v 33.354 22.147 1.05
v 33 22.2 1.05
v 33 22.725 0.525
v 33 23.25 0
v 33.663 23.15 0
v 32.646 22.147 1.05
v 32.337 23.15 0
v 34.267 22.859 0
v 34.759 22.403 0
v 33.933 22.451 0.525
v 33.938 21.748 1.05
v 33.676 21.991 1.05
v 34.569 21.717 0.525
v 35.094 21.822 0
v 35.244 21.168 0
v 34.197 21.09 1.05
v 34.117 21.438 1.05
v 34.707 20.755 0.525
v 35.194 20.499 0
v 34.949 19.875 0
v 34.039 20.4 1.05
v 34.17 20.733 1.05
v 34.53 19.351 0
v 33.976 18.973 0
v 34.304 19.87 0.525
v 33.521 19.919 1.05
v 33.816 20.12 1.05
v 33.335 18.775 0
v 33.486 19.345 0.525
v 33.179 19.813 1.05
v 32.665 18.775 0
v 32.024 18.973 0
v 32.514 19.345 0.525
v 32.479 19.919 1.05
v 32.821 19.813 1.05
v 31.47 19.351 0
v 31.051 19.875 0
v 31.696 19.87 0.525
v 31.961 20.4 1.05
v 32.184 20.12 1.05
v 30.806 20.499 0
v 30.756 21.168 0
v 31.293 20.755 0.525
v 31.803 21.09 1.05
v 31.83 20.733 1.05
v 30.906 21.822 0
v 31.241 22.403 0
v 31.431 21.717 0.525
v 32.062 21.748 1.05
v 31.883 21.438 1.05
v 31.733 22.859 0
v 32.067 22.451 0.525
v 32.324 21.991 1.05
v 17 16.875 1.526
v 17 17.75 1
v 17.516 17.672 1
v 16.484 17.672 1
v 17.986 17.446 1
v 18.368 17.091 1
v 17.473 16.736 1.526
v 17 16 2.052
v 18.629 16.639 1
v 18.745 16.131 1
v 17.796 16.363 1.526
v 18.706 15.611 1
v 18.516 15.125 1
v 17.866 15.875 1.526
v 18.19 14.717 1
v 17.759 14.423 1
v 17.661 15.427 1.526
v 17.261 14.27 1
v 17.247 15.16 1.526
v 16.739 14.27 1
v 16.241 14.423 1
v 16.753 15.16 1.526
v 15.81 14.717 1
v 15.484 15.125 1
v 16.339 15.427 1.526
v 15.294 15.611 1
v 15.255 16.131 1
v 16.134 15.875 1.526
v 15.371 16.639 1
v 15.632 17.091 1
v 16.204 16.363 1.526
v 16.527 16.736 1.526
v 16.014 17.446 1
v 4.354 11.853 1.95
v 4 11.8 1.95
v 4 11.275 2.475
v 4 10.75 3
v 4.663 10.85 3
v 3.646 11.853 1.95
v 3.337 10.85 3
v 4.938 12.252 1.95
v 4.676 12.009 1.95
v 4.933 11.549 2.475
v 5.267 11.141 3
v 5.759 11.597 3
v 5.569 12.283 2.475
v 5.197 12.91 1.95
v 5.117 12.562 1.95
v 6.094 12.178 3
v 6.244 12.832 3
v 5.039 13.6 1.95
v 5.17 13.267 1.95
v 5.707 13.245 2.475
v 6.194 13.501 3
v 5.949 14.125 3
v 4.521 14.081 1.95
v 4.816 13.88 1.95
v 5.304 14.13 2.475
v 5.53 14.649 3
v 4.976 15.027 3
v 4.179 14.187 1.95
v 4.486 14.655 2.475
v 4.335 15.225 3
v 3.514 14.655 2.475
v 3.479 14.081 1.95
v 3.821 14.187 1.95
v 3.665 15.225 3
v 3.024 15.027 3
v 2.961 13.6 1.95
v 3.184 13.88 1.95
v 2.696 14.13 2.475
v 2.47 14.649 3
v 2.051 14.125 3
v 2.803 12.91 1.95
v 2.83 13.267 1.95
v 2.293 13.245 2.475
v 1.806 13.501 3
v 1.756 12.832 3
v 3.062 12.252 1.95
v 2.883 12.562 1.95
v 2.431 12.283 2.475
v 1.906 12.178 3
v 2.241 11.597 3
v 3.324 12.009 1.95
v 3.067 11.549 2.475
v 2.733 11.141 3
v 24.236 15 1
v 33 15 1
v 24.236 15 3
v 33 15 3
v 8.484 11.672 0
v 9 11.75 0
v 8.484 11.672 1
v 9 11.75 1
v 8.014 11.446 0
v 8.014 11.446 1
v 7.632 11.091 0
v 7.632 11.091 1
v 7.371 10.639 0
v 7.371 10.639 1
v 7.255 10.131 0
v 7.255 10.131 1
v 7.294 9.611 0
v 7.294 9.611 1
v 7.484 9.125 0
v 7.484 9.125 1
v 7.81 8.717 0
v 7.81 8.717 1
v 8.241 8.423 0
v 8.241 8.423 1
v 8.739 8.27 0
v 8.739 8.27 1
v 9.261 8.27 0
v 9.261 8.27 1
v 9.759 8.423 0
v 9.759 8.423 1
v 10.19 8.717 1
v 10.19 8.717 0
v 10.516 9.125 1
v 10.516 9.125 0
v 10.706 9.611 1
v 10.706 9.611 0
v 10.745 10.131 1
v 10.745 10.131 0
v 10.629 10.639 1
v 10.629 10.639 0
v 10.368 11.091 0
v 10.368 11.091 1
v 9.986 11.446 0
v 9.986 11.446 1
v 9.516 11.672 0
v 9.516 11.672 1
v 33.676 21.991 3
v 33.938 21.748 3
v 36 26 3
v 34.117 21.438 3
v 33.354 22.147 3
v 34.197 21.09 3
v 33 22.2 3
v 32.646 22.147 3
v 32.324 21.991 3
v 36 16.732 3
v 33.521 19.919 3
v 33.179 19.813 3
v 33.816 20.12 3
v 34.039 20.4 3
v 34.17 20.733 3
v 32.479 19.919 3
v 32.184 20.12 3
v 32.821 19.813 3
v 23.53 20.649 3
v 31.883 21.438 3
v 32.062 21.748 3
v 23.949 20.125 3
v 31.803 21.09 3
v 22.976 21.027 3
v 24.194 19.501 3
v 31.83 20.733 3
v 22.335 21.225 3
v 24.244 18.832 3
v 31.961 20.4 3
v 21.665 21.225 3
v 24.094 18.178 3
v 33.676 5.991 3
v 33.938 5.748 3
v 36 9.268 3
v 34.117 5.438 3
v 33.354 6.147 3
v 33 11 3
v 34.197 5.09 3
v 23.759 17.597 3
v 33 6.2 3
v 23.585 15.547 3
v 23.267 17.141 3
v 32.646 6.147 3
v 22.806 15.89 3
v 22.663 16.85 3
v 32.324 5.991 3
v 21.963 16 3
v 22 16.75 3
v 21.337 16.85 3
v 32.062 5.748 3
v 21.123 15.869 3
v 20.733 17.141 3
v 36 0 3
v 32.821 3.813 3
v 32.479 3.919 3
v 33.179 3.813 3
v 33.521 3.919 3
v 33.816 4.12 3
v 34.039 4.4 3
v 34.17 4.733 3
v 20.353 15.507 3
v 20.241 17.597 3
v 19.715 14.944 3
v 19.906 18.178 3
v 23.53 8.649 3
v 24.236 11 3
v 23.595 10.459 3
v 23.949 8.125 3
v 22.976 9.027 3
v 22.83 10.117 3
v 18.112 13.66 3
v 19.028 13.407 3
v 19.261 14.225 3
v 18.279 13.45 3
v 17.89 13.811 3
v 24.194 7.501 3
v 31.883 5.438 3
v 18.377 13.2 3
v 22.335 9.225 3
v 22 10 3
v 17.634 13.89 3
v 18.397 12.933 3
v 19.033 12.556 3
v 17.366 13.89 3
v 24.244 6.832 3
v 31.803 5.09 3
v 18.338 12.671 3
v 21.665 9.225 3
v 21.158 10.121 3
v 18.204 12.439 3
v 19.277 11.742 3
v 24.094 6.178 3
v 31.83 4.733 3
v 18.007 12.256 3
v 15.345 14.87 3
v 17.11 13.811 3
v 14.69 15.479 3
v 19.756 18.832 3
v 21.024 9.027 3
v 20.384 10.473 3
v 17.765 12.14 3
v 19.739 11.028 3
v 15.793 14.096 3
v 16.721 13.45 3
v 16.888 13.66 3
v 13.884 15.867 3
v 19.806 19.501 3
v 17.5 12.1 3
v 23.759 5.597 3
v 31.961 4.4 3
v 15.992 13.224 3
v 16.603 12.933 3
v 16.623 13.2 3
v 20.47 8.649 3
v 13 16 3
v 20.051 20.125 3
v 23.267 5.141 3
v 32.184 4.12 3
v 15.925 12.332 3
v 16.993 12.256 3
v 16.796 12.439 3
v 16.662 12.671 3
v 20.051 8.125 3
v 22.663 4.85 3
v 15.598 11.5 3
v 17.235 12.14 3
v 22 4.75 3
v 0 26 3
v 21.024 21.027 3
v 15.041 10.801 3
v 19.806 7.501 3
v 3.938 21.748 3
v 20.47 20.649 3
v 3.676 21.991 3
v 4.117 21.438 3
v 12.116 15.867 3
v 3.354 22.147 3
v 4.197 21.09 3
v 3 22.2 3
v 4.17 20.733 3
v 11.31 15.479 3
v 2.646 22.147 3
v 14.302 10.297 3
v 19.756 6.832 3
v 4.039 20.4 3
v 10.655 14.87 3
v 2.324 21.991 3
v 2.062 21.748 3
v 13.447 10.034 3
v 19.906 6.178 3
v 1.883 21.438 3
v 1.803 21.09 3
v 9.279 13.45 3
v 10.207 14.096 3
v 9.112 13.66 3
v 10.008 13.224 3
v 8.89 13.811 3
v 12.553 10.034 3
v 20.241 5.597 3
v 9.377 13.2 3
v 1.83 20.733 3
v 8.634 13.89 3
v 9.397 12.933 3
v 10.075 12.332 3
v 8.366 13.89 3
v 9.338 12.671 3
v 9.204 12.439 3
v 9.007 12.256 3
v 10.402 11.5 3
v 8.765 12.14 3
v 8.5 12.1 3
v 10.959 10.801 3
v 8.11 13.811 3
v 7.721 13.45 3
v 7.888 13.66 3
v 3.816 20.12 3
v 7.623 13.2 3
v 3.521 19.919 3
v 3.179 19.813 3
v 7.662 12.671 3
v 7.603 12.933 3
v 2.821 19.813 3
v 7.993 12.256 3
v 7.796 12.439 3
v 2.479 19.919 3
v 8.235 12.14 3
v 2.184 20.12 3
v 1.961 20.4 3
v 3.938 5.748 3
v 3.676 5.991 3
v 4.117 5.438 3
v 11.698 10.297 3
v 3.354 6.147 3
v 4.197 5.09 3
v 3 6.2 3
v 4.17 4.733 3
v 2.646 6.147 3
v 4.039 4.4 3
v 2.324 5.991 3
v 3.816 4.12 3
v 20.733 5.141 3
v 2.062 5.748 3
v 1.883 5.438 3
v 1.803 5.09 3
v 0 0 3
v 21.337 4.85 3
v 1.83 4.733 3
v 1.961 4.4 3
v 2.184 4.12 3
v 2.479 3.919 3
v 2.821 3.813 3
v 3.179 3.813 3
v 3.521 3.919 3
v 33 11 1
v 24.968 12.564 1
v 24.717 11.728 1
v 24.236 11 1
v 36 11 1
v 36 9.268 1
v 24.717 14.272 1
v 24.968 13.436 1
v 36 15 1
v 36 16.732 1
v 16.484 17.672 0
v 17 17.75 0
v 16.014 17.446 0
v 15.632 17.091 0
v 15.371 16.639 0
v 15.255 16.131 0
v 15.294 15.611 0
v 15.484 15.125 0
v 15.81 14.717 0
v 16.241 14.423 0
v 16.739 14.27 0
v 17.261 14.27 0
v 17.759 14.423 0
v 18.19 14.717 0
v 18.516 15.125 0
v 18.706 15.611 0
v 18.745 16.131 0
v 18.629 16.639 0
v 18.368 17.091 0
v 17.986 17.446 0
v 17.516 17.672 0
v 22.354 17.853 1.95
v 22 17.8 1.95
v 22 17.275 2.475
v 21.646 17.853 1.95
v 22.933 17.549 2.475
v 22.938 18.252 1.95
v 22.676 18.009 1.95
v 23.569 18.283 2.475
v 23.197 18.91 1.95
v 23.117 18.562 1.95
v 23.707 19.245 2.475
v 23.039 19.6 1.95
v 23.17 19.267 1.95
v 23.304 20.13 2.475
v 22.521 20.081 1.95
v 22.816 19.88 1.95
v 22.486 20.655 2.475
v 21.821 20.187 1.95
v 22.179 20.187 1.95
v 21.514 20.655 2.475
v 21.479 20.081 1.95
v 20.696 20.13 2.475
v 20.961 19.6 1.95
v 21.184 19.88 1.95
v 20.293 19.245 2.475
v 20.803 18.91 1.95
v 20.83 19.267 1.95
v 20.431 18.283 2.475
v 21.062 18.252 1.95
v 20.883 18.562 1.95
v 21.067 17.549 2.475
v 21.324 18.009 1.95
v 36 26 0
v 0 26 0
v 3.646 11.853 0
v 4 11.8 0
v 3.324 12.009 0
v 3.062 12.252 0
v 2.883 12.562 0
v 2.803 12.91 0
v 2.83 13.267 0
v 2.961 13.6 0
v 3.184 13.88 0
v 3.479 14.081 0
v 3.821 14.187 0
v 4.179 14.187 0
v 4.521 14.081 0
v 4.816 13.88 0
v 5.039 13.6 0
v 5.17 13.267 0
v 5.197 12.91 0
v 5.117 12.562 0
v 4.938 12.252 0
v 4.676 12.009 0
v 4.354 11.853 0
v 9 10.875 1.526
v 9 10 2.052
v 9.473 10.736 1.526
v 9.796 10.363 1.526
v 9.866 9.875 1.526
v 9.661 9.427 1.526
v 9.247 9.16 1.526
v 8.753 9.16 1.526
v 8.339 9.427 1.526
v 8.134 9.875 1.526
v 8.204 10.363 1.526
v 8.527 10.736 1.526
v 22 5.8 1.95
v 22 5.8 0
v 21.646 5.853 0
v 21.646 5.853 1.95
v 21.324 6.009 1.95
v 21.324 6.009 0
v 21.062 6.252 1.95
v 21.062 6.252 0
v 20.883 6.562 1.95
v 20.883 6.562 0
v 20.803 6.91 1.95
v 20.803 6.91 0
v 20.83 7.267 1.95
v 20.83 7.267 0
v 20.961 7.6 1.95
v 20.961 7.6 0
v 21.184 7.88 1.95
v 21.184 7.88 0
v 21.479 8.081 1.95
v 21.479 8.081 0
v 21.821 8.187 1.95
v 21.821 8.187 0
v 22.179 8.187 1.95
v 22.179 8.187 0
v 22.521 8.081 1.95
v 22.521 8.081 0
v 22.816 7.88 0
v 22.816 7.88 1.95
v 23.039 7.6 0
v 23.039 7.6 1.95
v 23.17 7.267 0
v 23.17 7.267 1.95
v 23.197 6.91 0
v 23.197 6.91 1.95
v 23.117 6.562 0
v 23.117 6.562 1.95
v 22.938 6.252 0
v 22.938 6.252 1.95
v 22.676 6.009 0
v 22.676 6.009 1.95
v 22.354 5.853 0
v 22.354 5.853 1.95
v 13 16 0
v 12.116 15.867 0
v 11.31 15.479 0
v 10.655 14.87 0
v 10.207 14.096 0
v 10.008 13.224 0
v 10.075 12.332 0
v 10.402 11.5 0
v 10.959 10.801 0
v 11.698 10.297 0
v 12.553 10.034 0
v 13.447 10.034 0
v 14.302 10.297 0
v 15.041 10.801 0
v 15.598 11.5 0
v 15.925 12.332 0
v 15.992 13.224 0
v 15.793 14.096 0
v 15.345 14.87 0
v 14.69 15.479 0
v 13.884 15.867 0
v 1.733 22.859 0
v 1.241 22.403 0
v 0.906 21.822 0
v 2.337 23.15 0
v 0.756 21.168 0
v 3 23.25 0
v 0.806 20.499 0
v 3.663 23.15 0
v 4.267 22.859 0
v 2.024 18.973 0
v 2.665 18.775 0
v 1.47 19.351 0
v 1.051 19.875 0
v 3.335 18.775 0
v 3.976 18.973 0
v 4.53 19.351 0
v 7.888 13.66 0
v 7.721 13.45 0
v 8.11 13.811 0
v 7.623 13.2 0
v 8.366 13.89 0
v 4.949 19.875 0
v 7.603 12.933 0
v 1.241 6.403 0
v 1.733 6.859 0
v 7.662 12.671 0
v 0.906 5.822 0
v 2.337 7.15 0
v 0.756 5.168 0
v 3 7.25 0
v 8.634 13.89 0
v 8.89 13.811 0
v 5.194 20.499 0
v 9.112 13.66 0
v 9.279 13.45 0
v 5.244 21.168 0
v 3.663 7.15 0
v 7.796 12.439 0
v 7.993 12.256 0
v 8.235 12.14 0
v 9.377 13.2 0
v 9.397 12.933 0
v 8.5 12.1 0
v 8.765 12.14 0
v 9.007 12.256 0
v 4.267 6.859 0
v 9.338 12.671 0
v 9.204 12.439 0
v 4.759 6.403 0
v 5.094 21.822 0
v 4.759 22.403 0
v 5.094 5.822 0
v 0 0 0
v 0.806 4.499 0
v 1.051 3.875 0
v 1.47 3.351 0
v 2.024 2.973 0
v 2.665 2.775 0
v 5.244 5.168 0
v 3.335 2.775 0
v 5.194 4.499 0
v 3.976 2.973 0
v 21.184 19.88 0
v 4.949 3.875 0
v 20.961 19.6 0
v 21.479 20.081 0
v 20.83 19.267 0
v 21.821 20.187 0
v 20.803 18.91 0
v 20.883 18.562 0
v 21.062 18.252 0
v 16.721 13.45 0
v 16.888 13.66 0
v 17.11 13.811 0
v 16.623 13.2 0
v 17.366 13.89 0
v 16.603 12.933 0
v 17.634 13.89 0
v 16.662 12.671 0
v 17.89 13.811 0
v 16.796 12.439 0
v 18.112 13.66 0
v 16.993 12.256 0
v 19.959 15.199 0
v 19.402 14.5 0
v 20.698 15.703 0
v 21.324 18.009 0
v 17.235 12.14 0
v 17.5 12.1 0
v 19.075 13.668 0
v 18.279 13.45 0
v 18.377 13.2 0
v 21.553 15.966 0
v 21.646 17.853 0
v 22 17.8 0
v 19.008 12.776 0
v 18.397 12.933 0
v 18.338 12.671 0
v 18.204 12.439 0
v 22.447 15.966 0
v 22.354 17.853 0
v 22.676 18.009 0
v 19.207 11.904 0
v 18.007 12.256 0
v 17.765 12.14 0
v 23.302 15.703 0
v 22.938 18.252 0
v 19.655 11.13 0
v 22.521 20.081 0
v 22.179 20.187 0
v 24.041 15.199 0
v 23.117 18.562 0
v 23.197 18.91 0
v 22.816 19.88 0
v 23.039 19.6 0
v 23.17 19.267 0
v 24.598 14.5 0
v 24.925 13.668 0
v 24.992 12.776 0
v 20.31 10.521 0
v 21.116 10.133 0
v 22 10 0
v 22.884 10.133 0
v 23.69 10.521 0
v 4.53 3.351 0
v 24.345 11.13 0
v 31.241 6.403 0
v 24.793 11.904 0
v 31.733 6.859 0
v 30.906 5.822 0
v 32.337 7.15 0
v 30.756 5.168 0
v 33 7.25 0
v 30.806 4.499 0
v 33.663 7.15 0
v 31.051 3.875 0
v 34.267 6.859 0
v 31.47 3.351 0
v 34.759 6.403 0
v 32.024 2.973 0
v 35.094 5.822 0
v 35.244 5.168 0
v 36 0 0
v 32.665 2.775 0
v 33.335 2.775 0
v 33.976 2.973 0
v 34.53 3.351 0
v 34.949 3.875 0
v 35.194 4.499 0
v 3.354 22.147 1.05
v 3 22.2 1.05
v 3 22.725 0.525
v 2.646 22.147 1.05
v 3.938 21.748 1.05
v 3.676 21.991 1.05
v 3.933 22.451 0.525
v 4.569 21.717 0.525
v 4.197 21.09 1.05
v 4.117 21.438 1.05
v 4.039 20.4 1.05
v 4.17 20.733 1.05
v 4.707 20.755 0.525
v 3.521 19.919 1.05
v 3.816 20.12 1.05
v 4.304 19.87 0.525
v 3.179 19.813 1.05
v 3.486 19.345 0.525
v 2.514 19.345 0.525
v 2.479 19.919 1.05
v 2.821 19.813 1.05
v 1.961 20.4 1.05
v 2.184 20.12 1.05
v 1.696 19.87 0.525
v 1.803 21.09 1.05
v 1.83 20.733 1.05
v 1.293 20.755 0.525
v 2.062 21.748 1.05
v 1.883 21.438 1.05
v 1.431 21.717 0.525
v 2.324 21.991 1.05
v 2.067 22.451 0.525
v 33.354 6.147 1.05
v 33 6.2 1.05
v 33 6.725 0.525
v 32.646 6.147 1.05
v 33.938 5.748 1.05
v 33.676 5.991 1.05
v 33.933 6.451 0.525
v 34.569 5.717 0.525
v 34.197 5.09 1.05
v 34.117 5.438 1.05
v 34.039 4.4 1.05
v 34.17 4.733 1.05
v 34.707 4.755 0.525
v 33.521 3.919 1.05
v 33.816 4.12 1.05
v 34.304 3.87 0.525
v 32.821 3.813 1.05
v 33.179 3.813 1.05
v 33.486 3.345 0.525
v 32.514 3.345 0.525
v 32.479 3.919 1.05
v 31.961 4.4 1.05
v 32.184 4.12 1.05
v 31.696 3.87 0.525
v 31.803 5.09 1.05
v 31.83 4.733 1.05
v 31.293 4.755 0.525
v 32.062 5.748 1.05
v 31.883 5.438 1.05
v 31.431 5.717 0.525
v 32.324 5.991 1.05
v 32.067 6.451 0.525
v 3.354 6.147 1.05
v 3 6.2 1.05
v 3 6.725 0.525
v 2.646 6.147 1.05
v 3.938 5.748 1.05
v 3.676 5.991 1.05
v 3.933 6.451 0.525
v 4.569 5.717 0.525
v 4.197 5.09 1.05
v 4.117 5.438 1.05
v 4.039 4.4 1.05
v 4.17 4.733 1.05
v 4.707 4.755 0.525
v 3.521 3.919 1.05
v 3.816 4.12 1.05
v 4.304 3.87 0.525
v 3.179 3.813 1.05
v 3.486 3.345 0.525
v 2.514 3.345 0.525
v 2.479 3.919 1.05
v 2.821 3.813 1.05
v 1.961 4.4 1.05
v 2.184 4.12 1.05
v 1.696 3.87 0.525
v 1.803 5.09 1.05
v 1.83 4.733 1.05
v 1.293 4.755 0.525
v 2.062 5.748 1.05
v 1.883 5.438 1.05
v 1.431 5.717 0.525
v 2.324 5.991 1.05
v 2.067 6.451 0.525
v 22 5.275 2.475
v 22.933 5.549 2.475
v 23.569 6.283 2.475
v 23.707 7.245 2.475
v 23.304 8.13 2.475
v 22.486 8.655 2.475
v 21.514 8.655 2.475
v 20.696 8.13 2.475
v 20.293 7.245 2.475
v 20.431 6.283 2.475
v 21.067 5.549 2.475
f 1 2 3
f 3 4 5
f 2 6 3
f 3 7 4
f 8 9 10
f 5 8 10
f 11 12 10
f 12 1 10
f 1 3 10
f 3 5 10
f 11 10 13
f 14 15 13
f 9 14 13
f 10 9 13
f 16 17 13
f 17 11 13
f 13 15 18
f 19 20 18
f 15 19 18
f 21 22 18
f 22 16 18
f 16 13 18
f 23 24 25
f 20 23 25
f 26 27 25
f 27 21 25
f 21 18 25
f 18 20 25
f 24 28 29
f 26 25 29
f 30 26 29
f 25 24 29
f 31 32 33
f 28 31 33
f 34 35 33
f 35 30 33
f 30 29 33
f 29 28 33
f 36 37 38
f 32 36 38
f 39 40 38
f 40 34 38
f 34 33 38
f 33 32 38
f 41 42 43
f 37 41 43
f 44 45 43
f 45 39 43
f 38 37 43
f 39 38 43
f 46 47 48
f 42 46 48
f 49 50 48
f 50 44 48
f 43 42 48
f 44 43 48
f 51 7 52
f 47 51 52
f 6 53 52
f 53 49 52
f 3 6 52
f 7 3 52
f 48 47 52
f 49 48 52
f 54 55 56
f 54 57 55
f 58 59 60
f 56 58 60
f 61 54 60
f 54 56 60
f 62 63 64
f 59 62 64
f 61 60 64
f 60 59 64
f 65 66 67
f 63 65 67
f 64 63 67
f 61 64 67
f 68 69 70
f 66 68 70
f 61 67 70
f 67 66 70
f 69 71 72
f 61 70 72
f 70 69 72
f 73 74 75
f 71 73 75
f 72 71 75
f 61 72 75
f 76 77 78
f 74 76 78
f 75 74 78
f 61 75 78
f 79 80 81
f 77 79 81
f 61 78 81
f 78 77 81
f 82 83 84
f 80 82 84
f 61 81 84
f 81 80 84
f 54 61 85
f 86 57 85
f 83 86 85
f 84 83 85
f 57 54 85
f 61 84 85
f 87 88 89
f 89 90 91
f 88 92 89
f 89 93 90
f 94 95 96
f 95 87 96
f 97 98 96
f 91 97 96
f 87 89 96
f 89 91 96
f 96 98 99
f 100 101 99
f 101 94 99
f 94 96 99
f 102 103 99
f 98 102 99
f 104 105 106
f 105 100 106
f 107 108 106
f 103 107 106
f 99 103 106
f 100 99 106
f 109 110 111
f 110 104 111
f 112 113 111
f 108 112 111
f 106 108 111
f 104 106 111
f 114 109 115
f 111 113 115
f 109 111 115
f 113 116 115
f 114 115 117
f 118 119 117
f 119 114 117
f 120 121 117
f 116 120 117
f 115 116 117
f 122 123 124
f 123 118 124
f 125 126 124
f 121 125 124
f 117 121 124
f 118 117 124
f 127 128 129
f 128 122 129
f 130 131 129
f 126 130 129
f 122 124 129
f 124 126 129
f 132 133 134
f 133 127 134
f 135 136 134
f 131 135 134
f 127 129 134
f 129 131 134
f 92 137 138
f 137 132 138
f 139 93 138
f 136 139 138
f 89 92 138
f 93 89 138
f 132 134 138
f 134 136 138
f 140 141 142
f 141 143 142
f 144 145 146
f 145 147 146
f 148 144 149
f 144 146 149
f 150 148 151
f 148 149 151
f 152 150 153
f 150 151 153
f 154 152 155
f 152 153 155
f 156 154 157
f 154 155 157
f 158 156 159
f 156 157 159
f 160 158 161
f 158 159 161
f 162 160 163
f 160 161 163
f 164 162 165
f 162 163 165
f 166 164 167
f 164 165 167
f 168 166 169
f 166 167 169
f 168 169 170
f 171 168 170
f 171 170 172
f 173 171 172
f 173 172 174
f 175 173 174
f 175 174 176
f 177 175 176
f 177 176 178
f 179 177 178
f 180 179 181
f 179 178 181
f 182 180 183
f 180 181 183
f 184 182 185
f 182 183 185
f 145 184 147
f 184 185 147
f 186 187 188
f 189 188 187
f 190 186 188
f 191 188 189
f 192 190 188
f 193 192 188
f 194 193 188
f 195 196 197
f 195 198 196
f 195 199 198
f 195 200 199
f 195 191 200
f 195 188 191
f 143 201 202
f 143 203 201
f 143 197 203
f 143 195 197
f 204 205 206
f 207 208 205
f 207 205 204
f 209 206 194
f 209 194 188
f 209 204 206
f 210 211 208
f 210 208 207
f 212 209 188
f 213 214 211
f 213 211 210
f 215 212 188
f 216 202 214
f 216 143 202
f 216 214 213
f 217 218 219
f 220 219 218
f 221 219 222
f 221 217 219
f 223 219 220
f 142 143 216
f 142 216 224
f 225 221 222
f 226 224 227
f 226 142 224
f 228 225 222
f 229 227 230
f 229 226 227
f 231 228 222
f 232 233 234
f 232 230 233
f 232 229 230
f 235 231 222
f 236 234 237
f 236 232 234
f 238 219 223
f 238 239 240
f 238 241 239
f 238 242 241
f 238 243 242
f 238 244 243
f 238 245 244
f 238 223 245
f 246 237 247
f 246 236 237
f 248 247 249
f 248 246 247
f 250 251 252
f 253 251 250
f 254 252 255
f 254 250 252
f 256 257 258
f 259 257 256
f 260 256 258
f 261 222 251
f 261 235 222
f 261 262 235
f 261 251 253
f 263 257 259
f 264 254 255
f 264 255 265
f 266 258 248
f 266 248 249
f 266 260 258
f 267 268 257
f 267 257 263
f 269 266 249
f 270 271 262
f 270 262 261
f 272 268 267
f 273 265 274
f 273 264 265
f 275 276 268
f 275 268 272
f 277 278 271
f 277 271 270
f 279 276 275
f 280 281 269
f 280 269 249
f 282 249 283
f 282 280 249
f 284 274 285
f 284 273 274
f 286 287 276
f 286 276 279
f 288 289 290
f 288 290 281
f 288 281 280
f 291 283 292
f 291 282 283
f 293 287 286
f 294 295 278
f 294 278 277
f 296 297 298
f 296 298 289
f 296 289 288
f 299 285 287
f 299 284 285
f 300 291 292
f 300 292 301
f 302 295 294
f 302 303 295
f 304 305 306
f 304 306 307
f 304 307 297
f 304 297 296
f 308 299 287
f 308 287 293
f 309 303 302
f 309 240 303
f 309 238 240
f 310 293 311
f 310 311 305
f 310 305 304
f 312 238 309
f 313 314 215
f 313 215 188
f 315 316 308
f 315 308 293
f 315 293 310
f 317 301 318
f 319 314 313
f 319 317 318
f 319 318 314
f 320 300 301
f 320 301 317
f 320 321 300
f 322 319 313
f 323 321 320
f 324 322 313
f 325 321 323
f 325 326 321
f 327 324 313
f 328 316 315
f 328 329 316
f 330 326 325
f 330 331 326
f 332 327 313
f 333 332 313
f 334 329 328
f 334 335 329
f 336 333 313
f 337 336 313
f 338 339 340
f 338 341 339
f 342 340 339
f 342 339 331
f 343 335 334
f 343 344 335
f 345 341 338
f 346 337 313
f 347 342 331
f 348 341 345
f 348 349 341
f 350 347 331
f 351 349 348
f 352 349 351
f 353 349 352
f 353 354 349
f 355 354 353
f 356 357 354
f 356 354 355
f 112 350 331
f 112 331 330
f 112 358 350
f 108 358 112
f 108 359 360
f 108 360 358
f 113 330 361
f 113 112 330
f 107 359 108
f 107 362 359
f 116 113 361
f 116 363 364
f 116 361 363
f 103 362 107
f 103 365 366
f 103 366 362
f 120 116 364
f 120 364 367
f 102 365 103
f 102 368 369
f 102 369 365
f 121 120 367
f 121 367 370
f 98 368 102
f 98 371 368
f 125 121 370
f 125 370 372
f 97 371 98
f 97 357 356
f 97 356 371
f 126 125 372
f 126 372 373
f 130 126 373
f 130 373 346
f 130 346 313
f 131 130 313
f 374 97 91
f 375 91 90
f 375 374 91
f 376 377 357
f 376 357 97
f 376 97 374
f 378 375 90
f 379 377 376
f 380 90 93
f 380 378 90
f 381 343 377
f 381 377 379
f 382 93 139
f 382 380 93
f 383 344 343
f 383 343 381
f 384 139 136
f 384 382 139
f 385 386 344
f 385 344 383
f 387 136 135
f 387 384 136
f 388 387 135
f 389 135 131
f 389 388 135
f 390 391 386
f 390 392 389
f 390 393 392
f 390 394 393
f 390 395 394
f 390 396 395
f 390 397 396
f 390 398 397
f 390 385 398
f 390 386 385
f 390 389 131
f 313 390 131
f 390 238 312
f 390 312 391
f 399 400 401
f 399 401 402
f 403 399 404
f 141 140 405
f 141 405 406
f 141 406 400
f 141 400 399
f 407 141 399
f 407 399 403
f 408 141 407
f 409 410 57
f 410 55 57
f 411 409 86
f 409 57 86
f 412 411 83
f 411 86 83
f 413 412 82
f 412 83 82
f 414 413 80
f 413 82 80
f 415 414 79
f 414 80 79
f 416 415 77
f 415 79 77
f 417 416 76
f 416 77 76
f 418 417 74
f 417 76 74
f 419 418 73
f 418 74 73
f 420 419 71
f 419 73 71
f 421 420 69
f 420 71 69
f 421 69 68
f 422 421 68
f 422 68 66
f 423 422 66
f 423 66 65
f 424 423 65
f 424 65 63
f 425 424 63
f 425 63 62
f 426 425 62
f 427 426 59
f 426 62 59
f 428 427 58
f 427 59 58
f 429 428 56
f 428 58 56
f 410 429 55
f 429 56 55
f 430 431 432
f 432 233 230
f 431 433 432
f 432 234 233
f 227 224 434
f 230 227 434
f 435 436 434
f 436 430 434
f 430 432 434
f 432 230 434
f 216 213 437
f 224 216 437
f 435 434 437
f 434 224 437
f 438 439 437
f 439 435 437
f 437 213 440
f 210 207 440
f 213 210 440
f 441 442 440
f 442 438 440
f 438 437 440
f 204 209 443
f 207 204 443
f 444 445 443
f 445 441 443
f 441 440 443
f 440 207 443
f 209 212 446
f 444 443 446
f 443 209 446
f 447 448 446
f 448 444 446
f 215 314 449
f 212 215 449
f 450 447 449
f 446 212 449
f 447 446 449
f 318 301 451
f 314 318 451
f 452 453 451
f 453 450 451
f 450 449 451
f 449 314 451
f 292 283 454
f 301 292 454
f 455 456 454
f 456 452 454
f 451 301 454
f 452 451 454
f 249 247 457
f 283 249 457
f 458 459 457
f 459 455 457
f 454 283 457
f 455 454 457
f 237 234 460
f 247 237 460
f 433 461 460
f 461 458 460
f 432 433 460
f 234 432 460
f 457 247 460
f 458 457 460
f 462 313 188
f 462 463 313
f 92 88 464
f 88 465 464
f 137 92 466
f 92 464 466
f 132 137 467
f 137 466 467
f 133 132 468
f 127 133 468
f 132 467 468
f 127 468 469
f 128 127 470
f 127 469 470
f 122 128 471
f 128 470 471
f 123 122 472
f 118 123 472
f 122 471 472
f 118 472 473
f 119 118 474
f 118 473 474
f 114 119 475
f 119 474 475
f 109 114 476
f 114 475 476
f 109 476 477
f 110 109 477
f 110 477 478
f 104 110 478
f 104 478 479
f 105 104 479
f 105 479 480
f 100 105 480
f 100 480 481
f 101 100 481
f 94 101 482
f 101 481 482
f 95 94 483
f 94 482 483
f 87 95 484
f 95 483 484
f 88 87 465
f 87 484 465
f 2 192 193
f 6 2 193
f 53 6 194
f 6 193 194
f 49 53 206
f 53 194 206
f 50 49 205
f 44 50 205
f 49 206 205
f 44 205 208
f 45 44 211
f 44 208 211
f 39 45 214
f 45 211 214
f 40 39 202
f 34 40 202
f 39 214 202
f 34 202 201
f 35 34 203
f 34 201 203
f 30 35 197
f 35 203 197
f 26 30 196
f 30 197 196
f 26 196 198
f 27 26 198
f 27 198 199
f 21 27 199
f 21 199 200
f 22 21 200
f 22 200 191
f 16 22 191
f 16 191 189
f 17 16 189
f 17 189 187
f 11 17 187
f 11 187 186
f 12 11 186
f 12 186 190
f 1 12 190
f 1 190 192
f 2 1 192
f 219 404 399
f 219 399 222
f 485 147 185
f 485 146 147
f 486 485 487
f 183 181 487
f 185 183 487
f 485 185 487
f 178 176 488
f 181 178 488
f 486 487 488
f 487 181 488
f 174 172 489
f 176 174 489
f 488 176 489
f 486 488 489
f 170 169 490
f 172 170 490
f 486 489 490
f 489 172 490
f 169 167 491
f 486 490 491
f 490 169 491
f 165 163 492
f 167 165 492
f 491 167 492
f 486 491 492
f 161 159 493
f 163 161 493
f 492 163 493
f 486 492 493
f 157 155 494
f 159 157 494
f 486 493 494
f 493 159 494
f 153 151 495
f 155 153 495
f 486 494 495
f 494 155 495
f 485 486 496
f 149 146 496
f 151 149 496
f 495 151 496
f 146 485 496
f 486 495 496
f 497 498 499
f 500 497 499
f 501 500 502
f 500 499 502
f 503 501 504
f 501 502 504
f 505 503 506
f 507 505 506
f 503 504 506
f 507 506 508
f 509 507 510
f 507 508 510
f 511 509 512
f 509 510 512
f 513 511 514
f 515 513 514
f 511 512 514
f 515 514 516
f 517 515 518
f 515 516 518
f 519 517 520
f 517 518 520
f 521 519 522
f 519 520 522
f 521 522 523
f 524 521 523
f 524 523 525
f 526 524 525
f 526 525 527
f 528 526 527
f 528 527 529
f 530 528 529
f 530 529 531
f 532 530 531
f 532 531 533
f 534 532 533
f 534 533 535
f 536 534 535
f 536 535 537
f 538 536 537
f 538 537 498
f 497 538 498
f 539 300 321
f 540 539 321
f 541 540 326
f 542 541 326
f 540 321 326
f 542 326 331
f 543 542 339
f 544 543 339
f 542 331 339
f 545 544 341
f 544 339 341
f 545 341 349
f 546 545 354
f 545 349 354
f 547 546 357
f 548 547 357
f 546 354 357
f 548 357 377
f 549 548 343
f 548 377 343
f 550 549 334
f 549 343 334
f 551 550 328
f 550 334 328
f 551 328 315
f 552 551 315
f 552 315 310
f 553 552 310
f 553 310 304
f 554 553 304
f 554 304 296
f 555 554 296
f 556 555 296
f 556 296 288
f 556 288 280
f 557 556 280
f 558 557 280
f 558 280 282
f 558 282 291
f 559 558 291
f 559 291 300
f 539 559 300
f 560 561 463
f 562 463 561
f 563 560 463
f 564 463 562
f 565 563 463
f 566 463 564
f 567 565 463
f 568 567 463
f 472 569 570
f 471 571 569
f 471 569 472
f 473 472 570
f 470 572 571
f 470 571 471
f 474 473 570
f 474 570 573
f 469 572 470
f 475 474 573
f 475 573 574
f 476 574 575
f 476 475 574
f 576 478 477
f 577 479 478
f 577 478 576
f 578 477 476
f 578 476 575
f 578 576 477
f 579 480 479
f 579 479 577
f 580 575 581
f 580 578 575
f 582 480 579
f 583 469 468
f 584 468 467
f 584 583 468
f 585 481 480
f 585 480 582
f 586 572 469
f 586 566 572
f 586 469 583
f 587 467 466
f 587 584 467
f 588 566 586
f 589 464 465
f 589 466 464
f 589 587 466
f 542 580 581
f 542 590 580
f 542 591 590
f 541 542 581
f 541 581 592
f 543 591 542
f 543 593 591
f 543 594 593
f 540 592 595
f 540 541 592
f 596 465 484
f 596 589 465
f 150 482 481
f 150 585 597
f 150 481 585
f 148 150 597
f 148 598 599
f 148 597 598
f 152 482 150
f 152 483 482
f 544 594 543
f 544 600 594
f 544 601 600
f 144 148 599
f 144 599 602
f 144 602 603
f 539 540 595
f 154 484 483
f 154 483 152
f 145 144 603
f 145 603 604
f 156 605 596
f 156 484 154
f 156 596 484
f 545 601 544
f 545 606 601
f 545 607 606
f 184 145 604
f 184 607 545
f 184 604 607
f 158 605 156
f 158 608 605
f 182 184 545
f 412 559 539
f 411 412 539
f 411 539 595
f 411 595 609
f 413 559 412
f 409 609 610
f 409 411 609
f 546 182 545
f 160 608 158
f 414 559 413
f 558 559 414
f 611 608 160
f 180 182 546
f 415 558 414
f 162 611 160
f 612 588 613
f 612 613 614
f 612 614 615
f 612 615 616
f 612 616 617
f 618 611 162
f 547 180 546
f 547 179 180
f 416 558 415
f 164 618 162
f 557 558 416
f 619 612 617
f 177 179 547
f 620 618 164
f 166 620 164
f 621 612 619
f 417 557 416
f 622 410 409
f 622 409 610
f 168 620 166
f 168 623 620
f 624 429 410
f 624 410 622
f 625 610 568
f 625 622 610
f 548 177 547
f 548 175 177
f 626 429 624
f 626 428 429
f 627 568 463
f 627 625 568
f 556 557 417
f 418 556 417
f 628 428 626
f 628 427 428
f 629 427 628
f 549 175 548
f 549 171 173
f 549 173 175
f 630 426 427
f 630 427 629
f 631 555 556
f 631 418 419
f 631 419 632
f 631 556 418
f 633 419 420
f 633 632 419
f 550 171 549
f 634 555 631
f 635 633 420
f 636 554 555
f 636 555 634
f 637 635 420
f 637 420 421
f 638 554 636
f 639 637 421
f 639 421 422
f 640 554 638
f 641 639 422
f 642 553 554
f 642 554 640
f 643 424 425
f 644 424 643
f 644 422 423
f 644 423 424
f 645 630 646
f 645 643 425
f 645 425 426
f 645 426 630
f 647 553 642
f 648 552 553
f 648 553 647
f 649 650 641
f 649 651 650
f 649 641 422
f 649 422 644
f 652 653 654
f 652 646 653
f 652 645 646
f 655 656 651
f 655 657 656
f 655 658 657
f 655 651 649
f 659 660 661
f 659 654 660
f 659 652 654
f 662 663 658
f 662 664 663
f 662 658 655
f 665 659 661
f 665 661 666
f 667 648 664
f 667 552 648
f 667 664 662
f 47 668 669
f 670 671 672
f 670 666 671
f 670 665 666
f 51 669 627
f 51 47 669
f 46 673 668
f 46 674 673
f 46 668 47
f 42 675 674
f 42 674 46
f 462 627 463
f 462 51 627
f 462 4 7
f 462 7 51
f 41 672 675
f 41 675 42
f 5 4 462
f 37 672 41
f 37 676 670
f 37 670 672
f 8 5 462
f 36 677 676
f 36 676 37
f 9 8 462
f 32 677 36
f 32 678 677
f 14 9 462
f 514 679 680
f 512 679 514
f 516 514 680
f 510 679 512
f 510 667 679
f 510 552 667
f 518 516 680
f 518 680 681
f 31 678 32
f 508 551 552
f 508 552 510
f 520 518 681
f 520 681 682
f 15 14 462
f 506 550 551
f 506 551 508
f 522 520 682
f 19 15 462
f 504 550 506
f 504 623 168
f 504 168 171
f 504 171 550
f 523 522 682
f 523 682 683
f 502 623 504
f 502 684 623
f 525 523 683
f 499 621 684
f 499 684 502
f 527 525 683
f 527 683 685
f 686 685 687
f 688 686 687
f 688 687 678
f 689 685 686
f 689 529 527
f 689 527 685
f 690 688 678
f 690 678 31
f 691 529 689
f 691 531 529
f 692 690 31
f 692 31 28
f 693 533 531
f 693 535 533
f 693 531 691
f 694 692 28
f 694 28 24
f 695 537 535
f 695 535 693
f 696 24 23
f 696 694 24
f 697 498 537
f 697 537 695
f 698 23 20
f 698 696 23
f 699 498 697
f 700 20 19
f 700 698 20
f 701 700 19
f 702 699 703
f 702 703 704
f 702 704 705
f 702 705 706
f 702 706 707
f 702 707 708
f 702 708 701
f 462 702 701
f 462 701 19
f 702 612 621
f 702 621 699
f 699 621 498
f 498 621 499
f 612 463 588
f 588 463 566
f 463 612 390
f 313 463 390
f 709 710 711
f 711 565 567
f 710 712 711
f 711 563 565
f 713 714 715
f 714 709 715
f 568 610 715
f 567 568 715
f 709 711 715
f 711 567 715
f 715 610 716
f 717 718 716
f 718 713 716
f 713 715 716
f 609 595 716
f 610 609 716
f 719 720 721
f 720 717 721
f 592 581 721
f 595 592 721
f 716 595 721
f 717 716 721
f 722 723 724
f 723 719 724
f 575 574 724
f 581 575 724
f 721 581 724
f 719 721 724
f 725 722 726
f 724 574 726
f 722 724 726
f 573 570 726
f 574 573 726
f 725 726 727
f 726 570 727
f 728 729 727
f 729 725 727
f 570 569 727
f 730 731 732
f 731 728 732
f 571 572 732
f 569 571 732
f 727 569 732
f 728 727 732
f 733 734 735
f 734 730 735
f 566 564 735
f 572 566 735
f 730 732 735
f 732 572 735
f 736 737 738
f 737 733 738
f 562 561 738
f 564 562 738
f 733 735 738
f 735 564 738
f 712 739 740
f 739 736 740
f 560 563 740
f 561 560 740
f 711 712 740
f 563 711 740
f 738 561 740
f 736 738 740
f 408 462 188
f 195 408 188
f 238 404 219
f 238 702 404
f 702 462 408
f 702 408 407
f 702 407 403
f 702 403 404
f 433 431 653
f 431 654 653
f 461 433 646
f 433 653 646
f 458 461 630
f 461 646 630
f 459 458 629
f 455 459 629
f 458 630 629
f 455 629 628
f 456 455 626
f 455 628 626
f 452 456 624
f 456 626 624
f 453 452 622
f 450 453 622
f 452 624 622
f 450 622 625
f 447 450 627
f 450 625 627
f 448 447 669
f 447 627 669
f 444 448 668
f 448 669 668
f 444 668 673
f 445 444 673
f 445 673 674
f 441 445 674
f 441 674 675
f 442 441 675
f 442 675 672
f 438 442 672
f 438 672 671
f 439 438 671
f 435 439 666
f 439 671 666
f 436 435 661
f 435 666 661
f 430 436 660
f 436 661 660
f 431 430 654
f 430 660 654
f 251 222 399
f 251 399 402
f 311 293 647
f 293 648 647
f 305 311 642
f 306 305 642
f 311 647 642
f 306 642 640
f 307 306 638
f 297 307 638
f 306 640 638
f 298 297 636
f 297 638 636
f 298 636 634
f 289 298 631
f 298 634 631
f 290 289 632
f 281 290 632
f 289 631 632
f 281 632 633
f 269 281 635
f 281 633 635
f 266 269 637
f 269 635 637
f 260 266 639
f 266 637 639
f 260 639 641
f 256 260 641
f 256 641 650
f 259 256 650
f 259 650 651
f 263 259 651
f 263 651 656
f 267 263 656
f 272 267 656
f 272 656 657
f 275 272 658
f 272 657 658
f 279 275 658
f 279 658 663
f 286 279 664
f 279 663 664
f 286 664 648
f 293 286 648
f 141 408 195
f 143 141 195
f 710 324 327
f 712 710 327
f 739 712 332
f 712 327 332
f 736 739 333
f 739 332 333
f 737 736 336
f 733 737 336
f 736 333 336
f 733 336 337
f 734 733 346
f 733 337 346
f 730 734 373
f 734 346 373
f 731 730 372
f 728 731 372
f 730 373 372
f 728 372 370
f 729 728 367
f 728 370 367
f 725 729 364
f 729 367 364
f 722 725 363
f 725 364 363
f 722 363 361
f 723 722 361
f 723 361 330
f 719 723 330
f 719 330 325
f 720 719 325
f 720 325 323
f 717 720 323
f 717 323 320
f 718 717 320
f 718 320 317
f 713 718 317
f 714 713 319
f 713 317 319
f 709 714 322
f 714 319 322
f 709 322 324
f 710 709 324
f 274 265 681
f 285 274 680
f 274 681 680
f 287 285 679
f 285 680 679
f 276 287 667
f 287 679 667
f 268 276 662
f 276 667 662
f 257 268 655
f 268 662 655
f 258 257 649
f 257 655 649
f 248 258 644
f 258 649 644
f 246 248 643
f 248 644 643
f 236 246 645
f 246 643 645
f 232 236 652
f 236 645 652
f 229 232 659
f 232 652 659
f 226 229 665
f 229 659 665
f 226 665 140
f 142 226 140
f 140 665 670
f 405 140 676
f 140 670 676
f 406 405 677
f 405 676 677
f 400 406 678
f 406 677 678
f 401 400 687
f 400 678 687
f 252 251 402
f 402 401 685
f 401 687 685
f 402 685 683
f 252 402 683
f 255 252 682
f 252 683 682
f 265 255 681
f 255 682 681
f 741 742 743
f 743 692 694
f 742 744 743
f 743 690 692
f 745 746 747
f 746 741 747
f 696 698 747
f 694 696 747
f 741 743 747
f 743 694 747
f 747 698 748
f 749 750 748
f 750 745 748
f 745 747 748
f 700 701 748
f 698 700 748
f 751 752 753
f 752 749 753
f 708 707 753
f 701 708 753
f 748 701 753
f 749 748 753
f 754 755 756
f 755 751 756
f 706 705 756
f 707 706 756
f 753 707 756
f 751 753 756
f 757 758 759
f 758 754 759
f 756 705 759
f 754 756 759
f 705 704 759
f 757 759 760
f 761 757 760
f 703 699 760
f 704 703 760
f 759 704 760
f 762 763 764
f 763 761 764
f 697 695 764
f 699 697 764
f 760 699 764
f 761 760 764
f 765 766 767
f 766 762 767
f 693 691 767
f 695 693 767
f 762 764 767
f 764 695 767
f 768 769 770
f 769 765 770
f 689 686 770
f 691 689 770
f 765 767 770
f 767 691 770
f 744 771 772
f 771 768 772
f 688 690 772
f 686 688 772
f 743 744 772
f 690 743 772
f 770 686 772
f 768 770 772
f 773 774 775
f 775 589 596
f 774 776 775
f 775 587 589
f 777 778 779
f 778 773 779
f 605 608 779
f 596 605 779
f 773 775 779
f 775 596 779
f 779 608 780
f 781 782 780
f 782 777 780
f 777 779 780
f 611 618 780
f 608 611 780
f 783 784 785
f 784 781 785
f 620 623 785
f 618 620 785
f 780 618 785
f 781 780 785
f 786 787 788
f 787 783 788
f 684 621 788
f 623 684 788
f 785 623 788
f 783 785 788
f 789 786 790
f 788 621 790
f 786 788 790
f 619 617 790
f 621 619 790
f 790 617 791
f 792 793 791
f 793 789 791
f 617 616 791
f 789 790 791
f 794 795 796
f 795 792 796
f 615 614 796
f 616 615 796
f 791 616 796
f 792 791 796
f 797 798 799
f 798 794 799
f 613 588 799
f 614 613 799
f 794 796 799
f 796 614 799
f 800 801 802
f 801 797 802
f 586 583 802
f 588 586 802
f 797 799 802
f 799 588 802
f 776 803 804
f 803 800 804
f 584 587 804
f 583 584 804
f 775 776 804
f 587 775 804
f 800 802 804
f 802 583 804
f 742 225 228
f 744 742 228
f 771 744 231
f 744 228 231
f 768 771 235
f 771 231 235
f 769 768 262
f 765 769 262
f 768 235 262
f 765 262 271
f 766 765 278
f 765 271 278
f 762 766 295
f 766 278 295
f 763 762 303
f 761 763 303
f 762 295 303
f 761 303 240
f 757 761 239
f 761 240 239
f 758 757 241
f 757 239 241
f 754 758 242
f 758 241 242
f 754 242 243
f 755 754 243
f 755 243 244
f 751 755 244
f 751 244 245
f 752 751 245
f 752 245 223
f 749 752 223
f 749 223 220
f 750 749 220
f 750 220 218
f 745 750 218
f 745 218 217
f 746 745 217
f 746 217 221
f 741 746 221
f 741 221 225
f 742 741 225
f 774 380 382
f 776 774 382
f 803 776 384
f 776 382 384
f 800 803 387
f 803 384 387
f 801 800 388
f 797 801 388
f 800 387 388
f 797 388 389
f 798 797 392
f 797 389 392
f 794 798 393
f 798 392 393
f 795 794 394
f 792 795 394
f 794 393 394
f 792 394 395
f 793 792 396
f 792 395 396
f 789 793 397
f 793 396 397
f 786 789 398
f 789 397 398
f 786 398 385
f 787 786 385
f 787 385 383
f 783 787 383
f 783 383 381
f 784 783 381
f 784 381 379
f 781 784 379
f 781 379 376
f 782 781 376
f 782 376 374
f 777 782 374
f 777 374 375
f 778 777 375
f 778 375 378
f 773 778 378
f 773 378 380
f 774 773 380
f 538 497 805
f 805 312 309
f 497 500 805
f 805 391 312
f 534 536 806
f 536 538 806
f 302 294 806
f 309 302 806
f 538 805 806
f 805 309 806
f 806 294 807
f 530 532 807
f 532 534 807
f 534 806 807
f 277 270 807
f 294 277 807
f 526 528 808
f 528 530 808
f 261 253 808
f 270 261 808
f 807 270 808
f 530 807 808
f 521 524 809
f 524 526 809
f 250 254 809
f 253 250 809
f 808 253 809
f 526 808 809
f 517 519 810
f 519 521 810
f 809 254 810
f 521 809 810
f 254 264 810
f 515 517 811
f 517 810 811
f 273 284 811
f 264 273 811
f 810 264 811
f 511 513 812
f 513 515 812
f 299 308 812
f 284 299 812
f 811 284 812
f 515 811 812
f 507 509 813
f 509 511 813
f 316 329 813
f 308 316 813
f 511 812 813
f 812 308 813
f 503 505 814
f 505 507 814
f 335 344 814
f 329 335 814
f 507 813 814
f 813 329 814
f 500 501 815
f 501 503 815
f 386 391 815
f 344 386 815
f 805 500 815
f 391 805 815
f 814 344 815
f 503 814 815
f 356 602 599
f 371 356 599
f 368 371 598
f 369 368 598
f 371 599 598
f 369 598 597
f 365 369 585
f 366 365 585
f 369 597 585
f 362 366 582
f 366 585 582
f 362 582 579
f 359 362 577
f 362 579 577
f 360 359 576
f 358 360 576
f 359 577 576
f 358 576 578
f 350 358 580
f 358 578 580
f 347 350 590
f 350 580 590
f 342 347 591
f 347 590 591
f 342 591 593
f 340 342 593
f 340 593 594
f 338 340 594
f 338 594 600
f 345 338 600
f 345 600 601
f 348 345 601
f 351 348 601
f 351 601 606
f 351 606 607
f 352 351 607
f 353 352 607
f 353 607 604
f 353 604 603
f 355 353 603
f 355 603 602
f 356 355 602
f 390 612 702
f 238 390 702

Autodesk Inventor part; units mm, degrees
ref_plane "YZ Plane" through (0, 0, 0) normal (1, 0, 0) x (0, 1, 0)
ref_plane "XZ Plane" through (0, 0, 0) normal (0, 1, 0) x (-1, 0, 0)
ref_plane "XY Plane" through (0, 0, 0) normal (0, 0, 1) x (1, 0, 0)
sketch "Skizze1" plane through (0, 0, 0) normal (0, 0, 1) x (1, 0, 0)
  line L0 (-7.2, 0) -> (43.2, 0) projected
  line L1 (0, -4.6) -> (0, 27.6) projected
  line L2 (0, 23) -> (36, 23)
  line L3 (36, 23) -> (36, 0)
  line L4 (36, 0) -> (0, 0)
  line L5 (0, 0) -> (0, 23)
  point P0 (0, 0)
  dimension "d0" = 36
  dimension "d1" = 23
extrude "Extrusion1" add sketch "Skizze1" along normal blind 3
hole "Bohrung1" at (13, 13, 0) direction (0, 0, 1) diameter 6 end through all
sketch "Skizze3" plane through (0, 0, 3) normal (0, 0, 1) x (1, 0, 0)
  line L0 (19, 18) -> (7, 18) projected
  line L1 (7, 18) -> (7, 8) projected
  line L2 (19, 8) -> (19, 18) projected
  line L3 (7, 8) -> (19, 8) projected
  circle A0 centre (17, 16) radius 1.25 projected
  circle A1 centre (9, 10) radius 1.25 projected
  circle A2 centre (17.5, 13) radius 0.6105 projected
  circle A3 centre (8.5, 13) radius 0.6105 projected
  point P0 (8.5, 13)
  point P1 (17.5, 13)
hole "Bohrung2" at (8.5, 13, 3) at (17.5, 13, 3) direction (0, 0, -1) diameter 1.8 end through all
sketch "Skizze5" plane through (0, 0, 0) normal (0, 0, -1) x (-1, 0, 0)
  circle A0 centre (-17, 16) radius 1.25 projected
  circle A1 centre (-9, 10) radius 1.25 projected
  point P0 (-17, 16)
  point P1 (-9, 10)
hole "Bohrung3" at (17, 16, 0) at (9, 10, 0) direction (0, 0, 1) diameter 3.5 depth 1 tip angle 118
sketch "Skizze6" plane through (0, 23, 0) normal (0, 1, 0) x (1, 0, 0)
  line L0 (0, 0) -> (36, 0) projected
  line L1 (0, 0) -> (0, -3) projected
  line L2 (36, -3) -> (0, -3) projected
  line L3 (36, 0) -> (36, -3) projected
extrude "Extrusion2" add sketch "Skizze6" along normal blind 3
sketch "Skizze7" plane through (0, 0, 0) normal (0, 0, -1) x (-1, 0, 0)
  line L0 (-36, 26) -> (-36, 0) projected
  line L1 (-36, 0) -> (0, 0) projected
  line L2 (0, 0) -> (0, 26) projected
  line L3 (-36, 26) -> (0, 26) projected
  line L4 (-36, 25.9998) -> (0, 25.9998) projected
  line L5 (-6, 23) -> (-6, 3) projected
  line L6 (-26, 3) -> (-26, 23) projected
  line L7 (-36, 23) -> (0, 23) projected
  line L8 (0, 0) -> (-36, 0) projected
  line L9 (-6, 3) -> (-26, 3) projected
  line L10 (-6.5, 9) -> (-6.5, 17) projected
  arc A0 (-6.5, 17) -> (-8, 18.5) centre (-8, 17) ccw projected
  line L11 (-8, 18.5) -> (-10.0314, 18.5) projected
  line L12 (-15.9686, 18.5) -> (-18, 18.5) projected
  arc A1 (-18, 18.5) -> (-19.5, 17) centre (-18, 17) ccw projected
  line L13 (-19, 8) -> (-19, 18) projected
  line L14 (-16.2253, 8) -> (-19, 8) projected
  line L15 (-19.5, 17) -> (-19.5, 16) projected
  arc A2 (-19.5, 16) -> (-18, 7.5) centre (-18, 9) ccw projected
  arc A3 (-10.0314, 7.5) -> (-10.0314, 18.5) centre (-13, 13) ccw projected
  line L16 (-18, 7.5) -> (-15.9686, 7.5) projected
  line L17 (-10.0314, 7.5) -> (-8, 7.5) projected
  arc A4 (-8, 7.5) -> (-6.5, 9) centre (-8, 9) ccw projected
  line L18 (-6.5, 9) -> (-6.5, 17) projected
  line L19 (-3, 0) -> (-3, 25.9998)
  line L20 (-33, 25.9998) -> (-33, 0)
  line L21 (-33, 21) -> (-3, 21)
  line L22 (-3, 21) -> (-3, 5)
  line L23 (-3, 5) -> (-33, 5)
  line L24 (-33, 5) -> (-33, 21)
  line L25 (-36, 13) -> (0, 13)
  point P0 (-6, 23)
  dimension "d29" = 6
  dimension "d30" = 3
  dimension "d31" = 3
  dimension "d32" = 16
hole "Bohrung4" at (3, 21, 0) at (3, 5, 0) at (33, 21, 0) at (33, 5, 0) direction (0, 0, 1) diameter 2.4 end through all countersink diameter 4.5 countersink angle 90
sketch "Skizze9" plane through (0, 0, 3) normal (0, 0, 1) x (1, 0, 0)
  line L0 (0, 0) -> (0, 26) projected
  line L1 (36, 0) -> (36, 26) projected
  line L2 (3, 8) -> (2, 8) projected
  line L3 (2, 8) -> (2, 18) projected
  line L4 (2, 18) -> (3, 18) projected
  arc A0 (3, 18) -> (6, 21) centre (3, 21) ccw projected
  line L5 (6, 21) -> (6, 23) projected
  line L6 (6, 3) -> (6, 5) projected
  arc A1 (6, 5) -> (3, 8) centre (3, 5) ccw projected
  line L7 (0, 13) -> (36, 13)
  line L8 (22, 20.2065) -> (22, 3.5507)
  line L9 (6, 23) -> (30, 23) projected
  line L10 (30, 3) -> (30, 5) projected
  line L11 (6, 3) -> (30, 3) projected
  arc A2 (30, 21) -> (33, 18) centre (33, 21) ccw projected
  line L12 (34, 18) -> (33, 18) projected
  line L13 (34, 8) -> (34, 18) projected
  line L14 (33, 8) -> (34, 8) projected
  arc A3 (33, 8) -> (30, 5) centre (33, 5) ccw projected
  line L15 (30, 21) -> (30, 23) projected
  point P0 (22, 19)
  point P1 (22, 7)
  point P2 (4, 13)
  dimension "d41" = 22
  dimension "d42" = 14
  dimension "d43" = 12
  dimension "d44" = 4
hole "Bohrung5" at (22, 19, 3) at (22, 7, 3) at (4, 13, 3) direction (0, 0, -1) diameter 2.4 end through all countersink diameter 4.5 countersink angle 90
sketch "Skizze10" plane through (0, 0, 3) normal (0, 0, 1) x (1, 0, 0)
  circle A0 centre (22, 19) radius 2.25 projected
  line L0 (36, 0) -> (36, 26) projected
  line L1 (0, 26) -> (36, 26) projected
  line L2 (36, 13) -> (19.5709, 13)
  line L3 (36, 11) -> (22, 11)
  line L4 (36, 15) -> (22, 15)
  line L5 (22, 15) -> (22, 11)
  line L6 (22, 19) -> (22, 15.7462)
  dimension "d52" = 4
extrude "Extrusion3" cut sketch "Skizze10" against normal blind 2 contours L3 L5 L2 L0 | L2 L5 L4 L0
sketch "Skizze11" plane through (0, 0, 3) normal (0, 0, 1) x (1, 0, 0)
  line L0 (22, 11) -> (22, 15) projected
  point P0 (22, 13)
hole "Bohrung6" at (22, 13, 3) direction (0, 0, -1) diameter 6 end through all
chamfer "Fase1" distance 3 angle 30 1 edges at (36, 11, 2) measured on face at (28.1574, 11, 2.3333)
chamfer "Fase2" distance 3 angle 30 1 edges at (36, 15, 2) measured on face at (32.0787, 15, 2.3333)
properties part number "13_1087_012"
